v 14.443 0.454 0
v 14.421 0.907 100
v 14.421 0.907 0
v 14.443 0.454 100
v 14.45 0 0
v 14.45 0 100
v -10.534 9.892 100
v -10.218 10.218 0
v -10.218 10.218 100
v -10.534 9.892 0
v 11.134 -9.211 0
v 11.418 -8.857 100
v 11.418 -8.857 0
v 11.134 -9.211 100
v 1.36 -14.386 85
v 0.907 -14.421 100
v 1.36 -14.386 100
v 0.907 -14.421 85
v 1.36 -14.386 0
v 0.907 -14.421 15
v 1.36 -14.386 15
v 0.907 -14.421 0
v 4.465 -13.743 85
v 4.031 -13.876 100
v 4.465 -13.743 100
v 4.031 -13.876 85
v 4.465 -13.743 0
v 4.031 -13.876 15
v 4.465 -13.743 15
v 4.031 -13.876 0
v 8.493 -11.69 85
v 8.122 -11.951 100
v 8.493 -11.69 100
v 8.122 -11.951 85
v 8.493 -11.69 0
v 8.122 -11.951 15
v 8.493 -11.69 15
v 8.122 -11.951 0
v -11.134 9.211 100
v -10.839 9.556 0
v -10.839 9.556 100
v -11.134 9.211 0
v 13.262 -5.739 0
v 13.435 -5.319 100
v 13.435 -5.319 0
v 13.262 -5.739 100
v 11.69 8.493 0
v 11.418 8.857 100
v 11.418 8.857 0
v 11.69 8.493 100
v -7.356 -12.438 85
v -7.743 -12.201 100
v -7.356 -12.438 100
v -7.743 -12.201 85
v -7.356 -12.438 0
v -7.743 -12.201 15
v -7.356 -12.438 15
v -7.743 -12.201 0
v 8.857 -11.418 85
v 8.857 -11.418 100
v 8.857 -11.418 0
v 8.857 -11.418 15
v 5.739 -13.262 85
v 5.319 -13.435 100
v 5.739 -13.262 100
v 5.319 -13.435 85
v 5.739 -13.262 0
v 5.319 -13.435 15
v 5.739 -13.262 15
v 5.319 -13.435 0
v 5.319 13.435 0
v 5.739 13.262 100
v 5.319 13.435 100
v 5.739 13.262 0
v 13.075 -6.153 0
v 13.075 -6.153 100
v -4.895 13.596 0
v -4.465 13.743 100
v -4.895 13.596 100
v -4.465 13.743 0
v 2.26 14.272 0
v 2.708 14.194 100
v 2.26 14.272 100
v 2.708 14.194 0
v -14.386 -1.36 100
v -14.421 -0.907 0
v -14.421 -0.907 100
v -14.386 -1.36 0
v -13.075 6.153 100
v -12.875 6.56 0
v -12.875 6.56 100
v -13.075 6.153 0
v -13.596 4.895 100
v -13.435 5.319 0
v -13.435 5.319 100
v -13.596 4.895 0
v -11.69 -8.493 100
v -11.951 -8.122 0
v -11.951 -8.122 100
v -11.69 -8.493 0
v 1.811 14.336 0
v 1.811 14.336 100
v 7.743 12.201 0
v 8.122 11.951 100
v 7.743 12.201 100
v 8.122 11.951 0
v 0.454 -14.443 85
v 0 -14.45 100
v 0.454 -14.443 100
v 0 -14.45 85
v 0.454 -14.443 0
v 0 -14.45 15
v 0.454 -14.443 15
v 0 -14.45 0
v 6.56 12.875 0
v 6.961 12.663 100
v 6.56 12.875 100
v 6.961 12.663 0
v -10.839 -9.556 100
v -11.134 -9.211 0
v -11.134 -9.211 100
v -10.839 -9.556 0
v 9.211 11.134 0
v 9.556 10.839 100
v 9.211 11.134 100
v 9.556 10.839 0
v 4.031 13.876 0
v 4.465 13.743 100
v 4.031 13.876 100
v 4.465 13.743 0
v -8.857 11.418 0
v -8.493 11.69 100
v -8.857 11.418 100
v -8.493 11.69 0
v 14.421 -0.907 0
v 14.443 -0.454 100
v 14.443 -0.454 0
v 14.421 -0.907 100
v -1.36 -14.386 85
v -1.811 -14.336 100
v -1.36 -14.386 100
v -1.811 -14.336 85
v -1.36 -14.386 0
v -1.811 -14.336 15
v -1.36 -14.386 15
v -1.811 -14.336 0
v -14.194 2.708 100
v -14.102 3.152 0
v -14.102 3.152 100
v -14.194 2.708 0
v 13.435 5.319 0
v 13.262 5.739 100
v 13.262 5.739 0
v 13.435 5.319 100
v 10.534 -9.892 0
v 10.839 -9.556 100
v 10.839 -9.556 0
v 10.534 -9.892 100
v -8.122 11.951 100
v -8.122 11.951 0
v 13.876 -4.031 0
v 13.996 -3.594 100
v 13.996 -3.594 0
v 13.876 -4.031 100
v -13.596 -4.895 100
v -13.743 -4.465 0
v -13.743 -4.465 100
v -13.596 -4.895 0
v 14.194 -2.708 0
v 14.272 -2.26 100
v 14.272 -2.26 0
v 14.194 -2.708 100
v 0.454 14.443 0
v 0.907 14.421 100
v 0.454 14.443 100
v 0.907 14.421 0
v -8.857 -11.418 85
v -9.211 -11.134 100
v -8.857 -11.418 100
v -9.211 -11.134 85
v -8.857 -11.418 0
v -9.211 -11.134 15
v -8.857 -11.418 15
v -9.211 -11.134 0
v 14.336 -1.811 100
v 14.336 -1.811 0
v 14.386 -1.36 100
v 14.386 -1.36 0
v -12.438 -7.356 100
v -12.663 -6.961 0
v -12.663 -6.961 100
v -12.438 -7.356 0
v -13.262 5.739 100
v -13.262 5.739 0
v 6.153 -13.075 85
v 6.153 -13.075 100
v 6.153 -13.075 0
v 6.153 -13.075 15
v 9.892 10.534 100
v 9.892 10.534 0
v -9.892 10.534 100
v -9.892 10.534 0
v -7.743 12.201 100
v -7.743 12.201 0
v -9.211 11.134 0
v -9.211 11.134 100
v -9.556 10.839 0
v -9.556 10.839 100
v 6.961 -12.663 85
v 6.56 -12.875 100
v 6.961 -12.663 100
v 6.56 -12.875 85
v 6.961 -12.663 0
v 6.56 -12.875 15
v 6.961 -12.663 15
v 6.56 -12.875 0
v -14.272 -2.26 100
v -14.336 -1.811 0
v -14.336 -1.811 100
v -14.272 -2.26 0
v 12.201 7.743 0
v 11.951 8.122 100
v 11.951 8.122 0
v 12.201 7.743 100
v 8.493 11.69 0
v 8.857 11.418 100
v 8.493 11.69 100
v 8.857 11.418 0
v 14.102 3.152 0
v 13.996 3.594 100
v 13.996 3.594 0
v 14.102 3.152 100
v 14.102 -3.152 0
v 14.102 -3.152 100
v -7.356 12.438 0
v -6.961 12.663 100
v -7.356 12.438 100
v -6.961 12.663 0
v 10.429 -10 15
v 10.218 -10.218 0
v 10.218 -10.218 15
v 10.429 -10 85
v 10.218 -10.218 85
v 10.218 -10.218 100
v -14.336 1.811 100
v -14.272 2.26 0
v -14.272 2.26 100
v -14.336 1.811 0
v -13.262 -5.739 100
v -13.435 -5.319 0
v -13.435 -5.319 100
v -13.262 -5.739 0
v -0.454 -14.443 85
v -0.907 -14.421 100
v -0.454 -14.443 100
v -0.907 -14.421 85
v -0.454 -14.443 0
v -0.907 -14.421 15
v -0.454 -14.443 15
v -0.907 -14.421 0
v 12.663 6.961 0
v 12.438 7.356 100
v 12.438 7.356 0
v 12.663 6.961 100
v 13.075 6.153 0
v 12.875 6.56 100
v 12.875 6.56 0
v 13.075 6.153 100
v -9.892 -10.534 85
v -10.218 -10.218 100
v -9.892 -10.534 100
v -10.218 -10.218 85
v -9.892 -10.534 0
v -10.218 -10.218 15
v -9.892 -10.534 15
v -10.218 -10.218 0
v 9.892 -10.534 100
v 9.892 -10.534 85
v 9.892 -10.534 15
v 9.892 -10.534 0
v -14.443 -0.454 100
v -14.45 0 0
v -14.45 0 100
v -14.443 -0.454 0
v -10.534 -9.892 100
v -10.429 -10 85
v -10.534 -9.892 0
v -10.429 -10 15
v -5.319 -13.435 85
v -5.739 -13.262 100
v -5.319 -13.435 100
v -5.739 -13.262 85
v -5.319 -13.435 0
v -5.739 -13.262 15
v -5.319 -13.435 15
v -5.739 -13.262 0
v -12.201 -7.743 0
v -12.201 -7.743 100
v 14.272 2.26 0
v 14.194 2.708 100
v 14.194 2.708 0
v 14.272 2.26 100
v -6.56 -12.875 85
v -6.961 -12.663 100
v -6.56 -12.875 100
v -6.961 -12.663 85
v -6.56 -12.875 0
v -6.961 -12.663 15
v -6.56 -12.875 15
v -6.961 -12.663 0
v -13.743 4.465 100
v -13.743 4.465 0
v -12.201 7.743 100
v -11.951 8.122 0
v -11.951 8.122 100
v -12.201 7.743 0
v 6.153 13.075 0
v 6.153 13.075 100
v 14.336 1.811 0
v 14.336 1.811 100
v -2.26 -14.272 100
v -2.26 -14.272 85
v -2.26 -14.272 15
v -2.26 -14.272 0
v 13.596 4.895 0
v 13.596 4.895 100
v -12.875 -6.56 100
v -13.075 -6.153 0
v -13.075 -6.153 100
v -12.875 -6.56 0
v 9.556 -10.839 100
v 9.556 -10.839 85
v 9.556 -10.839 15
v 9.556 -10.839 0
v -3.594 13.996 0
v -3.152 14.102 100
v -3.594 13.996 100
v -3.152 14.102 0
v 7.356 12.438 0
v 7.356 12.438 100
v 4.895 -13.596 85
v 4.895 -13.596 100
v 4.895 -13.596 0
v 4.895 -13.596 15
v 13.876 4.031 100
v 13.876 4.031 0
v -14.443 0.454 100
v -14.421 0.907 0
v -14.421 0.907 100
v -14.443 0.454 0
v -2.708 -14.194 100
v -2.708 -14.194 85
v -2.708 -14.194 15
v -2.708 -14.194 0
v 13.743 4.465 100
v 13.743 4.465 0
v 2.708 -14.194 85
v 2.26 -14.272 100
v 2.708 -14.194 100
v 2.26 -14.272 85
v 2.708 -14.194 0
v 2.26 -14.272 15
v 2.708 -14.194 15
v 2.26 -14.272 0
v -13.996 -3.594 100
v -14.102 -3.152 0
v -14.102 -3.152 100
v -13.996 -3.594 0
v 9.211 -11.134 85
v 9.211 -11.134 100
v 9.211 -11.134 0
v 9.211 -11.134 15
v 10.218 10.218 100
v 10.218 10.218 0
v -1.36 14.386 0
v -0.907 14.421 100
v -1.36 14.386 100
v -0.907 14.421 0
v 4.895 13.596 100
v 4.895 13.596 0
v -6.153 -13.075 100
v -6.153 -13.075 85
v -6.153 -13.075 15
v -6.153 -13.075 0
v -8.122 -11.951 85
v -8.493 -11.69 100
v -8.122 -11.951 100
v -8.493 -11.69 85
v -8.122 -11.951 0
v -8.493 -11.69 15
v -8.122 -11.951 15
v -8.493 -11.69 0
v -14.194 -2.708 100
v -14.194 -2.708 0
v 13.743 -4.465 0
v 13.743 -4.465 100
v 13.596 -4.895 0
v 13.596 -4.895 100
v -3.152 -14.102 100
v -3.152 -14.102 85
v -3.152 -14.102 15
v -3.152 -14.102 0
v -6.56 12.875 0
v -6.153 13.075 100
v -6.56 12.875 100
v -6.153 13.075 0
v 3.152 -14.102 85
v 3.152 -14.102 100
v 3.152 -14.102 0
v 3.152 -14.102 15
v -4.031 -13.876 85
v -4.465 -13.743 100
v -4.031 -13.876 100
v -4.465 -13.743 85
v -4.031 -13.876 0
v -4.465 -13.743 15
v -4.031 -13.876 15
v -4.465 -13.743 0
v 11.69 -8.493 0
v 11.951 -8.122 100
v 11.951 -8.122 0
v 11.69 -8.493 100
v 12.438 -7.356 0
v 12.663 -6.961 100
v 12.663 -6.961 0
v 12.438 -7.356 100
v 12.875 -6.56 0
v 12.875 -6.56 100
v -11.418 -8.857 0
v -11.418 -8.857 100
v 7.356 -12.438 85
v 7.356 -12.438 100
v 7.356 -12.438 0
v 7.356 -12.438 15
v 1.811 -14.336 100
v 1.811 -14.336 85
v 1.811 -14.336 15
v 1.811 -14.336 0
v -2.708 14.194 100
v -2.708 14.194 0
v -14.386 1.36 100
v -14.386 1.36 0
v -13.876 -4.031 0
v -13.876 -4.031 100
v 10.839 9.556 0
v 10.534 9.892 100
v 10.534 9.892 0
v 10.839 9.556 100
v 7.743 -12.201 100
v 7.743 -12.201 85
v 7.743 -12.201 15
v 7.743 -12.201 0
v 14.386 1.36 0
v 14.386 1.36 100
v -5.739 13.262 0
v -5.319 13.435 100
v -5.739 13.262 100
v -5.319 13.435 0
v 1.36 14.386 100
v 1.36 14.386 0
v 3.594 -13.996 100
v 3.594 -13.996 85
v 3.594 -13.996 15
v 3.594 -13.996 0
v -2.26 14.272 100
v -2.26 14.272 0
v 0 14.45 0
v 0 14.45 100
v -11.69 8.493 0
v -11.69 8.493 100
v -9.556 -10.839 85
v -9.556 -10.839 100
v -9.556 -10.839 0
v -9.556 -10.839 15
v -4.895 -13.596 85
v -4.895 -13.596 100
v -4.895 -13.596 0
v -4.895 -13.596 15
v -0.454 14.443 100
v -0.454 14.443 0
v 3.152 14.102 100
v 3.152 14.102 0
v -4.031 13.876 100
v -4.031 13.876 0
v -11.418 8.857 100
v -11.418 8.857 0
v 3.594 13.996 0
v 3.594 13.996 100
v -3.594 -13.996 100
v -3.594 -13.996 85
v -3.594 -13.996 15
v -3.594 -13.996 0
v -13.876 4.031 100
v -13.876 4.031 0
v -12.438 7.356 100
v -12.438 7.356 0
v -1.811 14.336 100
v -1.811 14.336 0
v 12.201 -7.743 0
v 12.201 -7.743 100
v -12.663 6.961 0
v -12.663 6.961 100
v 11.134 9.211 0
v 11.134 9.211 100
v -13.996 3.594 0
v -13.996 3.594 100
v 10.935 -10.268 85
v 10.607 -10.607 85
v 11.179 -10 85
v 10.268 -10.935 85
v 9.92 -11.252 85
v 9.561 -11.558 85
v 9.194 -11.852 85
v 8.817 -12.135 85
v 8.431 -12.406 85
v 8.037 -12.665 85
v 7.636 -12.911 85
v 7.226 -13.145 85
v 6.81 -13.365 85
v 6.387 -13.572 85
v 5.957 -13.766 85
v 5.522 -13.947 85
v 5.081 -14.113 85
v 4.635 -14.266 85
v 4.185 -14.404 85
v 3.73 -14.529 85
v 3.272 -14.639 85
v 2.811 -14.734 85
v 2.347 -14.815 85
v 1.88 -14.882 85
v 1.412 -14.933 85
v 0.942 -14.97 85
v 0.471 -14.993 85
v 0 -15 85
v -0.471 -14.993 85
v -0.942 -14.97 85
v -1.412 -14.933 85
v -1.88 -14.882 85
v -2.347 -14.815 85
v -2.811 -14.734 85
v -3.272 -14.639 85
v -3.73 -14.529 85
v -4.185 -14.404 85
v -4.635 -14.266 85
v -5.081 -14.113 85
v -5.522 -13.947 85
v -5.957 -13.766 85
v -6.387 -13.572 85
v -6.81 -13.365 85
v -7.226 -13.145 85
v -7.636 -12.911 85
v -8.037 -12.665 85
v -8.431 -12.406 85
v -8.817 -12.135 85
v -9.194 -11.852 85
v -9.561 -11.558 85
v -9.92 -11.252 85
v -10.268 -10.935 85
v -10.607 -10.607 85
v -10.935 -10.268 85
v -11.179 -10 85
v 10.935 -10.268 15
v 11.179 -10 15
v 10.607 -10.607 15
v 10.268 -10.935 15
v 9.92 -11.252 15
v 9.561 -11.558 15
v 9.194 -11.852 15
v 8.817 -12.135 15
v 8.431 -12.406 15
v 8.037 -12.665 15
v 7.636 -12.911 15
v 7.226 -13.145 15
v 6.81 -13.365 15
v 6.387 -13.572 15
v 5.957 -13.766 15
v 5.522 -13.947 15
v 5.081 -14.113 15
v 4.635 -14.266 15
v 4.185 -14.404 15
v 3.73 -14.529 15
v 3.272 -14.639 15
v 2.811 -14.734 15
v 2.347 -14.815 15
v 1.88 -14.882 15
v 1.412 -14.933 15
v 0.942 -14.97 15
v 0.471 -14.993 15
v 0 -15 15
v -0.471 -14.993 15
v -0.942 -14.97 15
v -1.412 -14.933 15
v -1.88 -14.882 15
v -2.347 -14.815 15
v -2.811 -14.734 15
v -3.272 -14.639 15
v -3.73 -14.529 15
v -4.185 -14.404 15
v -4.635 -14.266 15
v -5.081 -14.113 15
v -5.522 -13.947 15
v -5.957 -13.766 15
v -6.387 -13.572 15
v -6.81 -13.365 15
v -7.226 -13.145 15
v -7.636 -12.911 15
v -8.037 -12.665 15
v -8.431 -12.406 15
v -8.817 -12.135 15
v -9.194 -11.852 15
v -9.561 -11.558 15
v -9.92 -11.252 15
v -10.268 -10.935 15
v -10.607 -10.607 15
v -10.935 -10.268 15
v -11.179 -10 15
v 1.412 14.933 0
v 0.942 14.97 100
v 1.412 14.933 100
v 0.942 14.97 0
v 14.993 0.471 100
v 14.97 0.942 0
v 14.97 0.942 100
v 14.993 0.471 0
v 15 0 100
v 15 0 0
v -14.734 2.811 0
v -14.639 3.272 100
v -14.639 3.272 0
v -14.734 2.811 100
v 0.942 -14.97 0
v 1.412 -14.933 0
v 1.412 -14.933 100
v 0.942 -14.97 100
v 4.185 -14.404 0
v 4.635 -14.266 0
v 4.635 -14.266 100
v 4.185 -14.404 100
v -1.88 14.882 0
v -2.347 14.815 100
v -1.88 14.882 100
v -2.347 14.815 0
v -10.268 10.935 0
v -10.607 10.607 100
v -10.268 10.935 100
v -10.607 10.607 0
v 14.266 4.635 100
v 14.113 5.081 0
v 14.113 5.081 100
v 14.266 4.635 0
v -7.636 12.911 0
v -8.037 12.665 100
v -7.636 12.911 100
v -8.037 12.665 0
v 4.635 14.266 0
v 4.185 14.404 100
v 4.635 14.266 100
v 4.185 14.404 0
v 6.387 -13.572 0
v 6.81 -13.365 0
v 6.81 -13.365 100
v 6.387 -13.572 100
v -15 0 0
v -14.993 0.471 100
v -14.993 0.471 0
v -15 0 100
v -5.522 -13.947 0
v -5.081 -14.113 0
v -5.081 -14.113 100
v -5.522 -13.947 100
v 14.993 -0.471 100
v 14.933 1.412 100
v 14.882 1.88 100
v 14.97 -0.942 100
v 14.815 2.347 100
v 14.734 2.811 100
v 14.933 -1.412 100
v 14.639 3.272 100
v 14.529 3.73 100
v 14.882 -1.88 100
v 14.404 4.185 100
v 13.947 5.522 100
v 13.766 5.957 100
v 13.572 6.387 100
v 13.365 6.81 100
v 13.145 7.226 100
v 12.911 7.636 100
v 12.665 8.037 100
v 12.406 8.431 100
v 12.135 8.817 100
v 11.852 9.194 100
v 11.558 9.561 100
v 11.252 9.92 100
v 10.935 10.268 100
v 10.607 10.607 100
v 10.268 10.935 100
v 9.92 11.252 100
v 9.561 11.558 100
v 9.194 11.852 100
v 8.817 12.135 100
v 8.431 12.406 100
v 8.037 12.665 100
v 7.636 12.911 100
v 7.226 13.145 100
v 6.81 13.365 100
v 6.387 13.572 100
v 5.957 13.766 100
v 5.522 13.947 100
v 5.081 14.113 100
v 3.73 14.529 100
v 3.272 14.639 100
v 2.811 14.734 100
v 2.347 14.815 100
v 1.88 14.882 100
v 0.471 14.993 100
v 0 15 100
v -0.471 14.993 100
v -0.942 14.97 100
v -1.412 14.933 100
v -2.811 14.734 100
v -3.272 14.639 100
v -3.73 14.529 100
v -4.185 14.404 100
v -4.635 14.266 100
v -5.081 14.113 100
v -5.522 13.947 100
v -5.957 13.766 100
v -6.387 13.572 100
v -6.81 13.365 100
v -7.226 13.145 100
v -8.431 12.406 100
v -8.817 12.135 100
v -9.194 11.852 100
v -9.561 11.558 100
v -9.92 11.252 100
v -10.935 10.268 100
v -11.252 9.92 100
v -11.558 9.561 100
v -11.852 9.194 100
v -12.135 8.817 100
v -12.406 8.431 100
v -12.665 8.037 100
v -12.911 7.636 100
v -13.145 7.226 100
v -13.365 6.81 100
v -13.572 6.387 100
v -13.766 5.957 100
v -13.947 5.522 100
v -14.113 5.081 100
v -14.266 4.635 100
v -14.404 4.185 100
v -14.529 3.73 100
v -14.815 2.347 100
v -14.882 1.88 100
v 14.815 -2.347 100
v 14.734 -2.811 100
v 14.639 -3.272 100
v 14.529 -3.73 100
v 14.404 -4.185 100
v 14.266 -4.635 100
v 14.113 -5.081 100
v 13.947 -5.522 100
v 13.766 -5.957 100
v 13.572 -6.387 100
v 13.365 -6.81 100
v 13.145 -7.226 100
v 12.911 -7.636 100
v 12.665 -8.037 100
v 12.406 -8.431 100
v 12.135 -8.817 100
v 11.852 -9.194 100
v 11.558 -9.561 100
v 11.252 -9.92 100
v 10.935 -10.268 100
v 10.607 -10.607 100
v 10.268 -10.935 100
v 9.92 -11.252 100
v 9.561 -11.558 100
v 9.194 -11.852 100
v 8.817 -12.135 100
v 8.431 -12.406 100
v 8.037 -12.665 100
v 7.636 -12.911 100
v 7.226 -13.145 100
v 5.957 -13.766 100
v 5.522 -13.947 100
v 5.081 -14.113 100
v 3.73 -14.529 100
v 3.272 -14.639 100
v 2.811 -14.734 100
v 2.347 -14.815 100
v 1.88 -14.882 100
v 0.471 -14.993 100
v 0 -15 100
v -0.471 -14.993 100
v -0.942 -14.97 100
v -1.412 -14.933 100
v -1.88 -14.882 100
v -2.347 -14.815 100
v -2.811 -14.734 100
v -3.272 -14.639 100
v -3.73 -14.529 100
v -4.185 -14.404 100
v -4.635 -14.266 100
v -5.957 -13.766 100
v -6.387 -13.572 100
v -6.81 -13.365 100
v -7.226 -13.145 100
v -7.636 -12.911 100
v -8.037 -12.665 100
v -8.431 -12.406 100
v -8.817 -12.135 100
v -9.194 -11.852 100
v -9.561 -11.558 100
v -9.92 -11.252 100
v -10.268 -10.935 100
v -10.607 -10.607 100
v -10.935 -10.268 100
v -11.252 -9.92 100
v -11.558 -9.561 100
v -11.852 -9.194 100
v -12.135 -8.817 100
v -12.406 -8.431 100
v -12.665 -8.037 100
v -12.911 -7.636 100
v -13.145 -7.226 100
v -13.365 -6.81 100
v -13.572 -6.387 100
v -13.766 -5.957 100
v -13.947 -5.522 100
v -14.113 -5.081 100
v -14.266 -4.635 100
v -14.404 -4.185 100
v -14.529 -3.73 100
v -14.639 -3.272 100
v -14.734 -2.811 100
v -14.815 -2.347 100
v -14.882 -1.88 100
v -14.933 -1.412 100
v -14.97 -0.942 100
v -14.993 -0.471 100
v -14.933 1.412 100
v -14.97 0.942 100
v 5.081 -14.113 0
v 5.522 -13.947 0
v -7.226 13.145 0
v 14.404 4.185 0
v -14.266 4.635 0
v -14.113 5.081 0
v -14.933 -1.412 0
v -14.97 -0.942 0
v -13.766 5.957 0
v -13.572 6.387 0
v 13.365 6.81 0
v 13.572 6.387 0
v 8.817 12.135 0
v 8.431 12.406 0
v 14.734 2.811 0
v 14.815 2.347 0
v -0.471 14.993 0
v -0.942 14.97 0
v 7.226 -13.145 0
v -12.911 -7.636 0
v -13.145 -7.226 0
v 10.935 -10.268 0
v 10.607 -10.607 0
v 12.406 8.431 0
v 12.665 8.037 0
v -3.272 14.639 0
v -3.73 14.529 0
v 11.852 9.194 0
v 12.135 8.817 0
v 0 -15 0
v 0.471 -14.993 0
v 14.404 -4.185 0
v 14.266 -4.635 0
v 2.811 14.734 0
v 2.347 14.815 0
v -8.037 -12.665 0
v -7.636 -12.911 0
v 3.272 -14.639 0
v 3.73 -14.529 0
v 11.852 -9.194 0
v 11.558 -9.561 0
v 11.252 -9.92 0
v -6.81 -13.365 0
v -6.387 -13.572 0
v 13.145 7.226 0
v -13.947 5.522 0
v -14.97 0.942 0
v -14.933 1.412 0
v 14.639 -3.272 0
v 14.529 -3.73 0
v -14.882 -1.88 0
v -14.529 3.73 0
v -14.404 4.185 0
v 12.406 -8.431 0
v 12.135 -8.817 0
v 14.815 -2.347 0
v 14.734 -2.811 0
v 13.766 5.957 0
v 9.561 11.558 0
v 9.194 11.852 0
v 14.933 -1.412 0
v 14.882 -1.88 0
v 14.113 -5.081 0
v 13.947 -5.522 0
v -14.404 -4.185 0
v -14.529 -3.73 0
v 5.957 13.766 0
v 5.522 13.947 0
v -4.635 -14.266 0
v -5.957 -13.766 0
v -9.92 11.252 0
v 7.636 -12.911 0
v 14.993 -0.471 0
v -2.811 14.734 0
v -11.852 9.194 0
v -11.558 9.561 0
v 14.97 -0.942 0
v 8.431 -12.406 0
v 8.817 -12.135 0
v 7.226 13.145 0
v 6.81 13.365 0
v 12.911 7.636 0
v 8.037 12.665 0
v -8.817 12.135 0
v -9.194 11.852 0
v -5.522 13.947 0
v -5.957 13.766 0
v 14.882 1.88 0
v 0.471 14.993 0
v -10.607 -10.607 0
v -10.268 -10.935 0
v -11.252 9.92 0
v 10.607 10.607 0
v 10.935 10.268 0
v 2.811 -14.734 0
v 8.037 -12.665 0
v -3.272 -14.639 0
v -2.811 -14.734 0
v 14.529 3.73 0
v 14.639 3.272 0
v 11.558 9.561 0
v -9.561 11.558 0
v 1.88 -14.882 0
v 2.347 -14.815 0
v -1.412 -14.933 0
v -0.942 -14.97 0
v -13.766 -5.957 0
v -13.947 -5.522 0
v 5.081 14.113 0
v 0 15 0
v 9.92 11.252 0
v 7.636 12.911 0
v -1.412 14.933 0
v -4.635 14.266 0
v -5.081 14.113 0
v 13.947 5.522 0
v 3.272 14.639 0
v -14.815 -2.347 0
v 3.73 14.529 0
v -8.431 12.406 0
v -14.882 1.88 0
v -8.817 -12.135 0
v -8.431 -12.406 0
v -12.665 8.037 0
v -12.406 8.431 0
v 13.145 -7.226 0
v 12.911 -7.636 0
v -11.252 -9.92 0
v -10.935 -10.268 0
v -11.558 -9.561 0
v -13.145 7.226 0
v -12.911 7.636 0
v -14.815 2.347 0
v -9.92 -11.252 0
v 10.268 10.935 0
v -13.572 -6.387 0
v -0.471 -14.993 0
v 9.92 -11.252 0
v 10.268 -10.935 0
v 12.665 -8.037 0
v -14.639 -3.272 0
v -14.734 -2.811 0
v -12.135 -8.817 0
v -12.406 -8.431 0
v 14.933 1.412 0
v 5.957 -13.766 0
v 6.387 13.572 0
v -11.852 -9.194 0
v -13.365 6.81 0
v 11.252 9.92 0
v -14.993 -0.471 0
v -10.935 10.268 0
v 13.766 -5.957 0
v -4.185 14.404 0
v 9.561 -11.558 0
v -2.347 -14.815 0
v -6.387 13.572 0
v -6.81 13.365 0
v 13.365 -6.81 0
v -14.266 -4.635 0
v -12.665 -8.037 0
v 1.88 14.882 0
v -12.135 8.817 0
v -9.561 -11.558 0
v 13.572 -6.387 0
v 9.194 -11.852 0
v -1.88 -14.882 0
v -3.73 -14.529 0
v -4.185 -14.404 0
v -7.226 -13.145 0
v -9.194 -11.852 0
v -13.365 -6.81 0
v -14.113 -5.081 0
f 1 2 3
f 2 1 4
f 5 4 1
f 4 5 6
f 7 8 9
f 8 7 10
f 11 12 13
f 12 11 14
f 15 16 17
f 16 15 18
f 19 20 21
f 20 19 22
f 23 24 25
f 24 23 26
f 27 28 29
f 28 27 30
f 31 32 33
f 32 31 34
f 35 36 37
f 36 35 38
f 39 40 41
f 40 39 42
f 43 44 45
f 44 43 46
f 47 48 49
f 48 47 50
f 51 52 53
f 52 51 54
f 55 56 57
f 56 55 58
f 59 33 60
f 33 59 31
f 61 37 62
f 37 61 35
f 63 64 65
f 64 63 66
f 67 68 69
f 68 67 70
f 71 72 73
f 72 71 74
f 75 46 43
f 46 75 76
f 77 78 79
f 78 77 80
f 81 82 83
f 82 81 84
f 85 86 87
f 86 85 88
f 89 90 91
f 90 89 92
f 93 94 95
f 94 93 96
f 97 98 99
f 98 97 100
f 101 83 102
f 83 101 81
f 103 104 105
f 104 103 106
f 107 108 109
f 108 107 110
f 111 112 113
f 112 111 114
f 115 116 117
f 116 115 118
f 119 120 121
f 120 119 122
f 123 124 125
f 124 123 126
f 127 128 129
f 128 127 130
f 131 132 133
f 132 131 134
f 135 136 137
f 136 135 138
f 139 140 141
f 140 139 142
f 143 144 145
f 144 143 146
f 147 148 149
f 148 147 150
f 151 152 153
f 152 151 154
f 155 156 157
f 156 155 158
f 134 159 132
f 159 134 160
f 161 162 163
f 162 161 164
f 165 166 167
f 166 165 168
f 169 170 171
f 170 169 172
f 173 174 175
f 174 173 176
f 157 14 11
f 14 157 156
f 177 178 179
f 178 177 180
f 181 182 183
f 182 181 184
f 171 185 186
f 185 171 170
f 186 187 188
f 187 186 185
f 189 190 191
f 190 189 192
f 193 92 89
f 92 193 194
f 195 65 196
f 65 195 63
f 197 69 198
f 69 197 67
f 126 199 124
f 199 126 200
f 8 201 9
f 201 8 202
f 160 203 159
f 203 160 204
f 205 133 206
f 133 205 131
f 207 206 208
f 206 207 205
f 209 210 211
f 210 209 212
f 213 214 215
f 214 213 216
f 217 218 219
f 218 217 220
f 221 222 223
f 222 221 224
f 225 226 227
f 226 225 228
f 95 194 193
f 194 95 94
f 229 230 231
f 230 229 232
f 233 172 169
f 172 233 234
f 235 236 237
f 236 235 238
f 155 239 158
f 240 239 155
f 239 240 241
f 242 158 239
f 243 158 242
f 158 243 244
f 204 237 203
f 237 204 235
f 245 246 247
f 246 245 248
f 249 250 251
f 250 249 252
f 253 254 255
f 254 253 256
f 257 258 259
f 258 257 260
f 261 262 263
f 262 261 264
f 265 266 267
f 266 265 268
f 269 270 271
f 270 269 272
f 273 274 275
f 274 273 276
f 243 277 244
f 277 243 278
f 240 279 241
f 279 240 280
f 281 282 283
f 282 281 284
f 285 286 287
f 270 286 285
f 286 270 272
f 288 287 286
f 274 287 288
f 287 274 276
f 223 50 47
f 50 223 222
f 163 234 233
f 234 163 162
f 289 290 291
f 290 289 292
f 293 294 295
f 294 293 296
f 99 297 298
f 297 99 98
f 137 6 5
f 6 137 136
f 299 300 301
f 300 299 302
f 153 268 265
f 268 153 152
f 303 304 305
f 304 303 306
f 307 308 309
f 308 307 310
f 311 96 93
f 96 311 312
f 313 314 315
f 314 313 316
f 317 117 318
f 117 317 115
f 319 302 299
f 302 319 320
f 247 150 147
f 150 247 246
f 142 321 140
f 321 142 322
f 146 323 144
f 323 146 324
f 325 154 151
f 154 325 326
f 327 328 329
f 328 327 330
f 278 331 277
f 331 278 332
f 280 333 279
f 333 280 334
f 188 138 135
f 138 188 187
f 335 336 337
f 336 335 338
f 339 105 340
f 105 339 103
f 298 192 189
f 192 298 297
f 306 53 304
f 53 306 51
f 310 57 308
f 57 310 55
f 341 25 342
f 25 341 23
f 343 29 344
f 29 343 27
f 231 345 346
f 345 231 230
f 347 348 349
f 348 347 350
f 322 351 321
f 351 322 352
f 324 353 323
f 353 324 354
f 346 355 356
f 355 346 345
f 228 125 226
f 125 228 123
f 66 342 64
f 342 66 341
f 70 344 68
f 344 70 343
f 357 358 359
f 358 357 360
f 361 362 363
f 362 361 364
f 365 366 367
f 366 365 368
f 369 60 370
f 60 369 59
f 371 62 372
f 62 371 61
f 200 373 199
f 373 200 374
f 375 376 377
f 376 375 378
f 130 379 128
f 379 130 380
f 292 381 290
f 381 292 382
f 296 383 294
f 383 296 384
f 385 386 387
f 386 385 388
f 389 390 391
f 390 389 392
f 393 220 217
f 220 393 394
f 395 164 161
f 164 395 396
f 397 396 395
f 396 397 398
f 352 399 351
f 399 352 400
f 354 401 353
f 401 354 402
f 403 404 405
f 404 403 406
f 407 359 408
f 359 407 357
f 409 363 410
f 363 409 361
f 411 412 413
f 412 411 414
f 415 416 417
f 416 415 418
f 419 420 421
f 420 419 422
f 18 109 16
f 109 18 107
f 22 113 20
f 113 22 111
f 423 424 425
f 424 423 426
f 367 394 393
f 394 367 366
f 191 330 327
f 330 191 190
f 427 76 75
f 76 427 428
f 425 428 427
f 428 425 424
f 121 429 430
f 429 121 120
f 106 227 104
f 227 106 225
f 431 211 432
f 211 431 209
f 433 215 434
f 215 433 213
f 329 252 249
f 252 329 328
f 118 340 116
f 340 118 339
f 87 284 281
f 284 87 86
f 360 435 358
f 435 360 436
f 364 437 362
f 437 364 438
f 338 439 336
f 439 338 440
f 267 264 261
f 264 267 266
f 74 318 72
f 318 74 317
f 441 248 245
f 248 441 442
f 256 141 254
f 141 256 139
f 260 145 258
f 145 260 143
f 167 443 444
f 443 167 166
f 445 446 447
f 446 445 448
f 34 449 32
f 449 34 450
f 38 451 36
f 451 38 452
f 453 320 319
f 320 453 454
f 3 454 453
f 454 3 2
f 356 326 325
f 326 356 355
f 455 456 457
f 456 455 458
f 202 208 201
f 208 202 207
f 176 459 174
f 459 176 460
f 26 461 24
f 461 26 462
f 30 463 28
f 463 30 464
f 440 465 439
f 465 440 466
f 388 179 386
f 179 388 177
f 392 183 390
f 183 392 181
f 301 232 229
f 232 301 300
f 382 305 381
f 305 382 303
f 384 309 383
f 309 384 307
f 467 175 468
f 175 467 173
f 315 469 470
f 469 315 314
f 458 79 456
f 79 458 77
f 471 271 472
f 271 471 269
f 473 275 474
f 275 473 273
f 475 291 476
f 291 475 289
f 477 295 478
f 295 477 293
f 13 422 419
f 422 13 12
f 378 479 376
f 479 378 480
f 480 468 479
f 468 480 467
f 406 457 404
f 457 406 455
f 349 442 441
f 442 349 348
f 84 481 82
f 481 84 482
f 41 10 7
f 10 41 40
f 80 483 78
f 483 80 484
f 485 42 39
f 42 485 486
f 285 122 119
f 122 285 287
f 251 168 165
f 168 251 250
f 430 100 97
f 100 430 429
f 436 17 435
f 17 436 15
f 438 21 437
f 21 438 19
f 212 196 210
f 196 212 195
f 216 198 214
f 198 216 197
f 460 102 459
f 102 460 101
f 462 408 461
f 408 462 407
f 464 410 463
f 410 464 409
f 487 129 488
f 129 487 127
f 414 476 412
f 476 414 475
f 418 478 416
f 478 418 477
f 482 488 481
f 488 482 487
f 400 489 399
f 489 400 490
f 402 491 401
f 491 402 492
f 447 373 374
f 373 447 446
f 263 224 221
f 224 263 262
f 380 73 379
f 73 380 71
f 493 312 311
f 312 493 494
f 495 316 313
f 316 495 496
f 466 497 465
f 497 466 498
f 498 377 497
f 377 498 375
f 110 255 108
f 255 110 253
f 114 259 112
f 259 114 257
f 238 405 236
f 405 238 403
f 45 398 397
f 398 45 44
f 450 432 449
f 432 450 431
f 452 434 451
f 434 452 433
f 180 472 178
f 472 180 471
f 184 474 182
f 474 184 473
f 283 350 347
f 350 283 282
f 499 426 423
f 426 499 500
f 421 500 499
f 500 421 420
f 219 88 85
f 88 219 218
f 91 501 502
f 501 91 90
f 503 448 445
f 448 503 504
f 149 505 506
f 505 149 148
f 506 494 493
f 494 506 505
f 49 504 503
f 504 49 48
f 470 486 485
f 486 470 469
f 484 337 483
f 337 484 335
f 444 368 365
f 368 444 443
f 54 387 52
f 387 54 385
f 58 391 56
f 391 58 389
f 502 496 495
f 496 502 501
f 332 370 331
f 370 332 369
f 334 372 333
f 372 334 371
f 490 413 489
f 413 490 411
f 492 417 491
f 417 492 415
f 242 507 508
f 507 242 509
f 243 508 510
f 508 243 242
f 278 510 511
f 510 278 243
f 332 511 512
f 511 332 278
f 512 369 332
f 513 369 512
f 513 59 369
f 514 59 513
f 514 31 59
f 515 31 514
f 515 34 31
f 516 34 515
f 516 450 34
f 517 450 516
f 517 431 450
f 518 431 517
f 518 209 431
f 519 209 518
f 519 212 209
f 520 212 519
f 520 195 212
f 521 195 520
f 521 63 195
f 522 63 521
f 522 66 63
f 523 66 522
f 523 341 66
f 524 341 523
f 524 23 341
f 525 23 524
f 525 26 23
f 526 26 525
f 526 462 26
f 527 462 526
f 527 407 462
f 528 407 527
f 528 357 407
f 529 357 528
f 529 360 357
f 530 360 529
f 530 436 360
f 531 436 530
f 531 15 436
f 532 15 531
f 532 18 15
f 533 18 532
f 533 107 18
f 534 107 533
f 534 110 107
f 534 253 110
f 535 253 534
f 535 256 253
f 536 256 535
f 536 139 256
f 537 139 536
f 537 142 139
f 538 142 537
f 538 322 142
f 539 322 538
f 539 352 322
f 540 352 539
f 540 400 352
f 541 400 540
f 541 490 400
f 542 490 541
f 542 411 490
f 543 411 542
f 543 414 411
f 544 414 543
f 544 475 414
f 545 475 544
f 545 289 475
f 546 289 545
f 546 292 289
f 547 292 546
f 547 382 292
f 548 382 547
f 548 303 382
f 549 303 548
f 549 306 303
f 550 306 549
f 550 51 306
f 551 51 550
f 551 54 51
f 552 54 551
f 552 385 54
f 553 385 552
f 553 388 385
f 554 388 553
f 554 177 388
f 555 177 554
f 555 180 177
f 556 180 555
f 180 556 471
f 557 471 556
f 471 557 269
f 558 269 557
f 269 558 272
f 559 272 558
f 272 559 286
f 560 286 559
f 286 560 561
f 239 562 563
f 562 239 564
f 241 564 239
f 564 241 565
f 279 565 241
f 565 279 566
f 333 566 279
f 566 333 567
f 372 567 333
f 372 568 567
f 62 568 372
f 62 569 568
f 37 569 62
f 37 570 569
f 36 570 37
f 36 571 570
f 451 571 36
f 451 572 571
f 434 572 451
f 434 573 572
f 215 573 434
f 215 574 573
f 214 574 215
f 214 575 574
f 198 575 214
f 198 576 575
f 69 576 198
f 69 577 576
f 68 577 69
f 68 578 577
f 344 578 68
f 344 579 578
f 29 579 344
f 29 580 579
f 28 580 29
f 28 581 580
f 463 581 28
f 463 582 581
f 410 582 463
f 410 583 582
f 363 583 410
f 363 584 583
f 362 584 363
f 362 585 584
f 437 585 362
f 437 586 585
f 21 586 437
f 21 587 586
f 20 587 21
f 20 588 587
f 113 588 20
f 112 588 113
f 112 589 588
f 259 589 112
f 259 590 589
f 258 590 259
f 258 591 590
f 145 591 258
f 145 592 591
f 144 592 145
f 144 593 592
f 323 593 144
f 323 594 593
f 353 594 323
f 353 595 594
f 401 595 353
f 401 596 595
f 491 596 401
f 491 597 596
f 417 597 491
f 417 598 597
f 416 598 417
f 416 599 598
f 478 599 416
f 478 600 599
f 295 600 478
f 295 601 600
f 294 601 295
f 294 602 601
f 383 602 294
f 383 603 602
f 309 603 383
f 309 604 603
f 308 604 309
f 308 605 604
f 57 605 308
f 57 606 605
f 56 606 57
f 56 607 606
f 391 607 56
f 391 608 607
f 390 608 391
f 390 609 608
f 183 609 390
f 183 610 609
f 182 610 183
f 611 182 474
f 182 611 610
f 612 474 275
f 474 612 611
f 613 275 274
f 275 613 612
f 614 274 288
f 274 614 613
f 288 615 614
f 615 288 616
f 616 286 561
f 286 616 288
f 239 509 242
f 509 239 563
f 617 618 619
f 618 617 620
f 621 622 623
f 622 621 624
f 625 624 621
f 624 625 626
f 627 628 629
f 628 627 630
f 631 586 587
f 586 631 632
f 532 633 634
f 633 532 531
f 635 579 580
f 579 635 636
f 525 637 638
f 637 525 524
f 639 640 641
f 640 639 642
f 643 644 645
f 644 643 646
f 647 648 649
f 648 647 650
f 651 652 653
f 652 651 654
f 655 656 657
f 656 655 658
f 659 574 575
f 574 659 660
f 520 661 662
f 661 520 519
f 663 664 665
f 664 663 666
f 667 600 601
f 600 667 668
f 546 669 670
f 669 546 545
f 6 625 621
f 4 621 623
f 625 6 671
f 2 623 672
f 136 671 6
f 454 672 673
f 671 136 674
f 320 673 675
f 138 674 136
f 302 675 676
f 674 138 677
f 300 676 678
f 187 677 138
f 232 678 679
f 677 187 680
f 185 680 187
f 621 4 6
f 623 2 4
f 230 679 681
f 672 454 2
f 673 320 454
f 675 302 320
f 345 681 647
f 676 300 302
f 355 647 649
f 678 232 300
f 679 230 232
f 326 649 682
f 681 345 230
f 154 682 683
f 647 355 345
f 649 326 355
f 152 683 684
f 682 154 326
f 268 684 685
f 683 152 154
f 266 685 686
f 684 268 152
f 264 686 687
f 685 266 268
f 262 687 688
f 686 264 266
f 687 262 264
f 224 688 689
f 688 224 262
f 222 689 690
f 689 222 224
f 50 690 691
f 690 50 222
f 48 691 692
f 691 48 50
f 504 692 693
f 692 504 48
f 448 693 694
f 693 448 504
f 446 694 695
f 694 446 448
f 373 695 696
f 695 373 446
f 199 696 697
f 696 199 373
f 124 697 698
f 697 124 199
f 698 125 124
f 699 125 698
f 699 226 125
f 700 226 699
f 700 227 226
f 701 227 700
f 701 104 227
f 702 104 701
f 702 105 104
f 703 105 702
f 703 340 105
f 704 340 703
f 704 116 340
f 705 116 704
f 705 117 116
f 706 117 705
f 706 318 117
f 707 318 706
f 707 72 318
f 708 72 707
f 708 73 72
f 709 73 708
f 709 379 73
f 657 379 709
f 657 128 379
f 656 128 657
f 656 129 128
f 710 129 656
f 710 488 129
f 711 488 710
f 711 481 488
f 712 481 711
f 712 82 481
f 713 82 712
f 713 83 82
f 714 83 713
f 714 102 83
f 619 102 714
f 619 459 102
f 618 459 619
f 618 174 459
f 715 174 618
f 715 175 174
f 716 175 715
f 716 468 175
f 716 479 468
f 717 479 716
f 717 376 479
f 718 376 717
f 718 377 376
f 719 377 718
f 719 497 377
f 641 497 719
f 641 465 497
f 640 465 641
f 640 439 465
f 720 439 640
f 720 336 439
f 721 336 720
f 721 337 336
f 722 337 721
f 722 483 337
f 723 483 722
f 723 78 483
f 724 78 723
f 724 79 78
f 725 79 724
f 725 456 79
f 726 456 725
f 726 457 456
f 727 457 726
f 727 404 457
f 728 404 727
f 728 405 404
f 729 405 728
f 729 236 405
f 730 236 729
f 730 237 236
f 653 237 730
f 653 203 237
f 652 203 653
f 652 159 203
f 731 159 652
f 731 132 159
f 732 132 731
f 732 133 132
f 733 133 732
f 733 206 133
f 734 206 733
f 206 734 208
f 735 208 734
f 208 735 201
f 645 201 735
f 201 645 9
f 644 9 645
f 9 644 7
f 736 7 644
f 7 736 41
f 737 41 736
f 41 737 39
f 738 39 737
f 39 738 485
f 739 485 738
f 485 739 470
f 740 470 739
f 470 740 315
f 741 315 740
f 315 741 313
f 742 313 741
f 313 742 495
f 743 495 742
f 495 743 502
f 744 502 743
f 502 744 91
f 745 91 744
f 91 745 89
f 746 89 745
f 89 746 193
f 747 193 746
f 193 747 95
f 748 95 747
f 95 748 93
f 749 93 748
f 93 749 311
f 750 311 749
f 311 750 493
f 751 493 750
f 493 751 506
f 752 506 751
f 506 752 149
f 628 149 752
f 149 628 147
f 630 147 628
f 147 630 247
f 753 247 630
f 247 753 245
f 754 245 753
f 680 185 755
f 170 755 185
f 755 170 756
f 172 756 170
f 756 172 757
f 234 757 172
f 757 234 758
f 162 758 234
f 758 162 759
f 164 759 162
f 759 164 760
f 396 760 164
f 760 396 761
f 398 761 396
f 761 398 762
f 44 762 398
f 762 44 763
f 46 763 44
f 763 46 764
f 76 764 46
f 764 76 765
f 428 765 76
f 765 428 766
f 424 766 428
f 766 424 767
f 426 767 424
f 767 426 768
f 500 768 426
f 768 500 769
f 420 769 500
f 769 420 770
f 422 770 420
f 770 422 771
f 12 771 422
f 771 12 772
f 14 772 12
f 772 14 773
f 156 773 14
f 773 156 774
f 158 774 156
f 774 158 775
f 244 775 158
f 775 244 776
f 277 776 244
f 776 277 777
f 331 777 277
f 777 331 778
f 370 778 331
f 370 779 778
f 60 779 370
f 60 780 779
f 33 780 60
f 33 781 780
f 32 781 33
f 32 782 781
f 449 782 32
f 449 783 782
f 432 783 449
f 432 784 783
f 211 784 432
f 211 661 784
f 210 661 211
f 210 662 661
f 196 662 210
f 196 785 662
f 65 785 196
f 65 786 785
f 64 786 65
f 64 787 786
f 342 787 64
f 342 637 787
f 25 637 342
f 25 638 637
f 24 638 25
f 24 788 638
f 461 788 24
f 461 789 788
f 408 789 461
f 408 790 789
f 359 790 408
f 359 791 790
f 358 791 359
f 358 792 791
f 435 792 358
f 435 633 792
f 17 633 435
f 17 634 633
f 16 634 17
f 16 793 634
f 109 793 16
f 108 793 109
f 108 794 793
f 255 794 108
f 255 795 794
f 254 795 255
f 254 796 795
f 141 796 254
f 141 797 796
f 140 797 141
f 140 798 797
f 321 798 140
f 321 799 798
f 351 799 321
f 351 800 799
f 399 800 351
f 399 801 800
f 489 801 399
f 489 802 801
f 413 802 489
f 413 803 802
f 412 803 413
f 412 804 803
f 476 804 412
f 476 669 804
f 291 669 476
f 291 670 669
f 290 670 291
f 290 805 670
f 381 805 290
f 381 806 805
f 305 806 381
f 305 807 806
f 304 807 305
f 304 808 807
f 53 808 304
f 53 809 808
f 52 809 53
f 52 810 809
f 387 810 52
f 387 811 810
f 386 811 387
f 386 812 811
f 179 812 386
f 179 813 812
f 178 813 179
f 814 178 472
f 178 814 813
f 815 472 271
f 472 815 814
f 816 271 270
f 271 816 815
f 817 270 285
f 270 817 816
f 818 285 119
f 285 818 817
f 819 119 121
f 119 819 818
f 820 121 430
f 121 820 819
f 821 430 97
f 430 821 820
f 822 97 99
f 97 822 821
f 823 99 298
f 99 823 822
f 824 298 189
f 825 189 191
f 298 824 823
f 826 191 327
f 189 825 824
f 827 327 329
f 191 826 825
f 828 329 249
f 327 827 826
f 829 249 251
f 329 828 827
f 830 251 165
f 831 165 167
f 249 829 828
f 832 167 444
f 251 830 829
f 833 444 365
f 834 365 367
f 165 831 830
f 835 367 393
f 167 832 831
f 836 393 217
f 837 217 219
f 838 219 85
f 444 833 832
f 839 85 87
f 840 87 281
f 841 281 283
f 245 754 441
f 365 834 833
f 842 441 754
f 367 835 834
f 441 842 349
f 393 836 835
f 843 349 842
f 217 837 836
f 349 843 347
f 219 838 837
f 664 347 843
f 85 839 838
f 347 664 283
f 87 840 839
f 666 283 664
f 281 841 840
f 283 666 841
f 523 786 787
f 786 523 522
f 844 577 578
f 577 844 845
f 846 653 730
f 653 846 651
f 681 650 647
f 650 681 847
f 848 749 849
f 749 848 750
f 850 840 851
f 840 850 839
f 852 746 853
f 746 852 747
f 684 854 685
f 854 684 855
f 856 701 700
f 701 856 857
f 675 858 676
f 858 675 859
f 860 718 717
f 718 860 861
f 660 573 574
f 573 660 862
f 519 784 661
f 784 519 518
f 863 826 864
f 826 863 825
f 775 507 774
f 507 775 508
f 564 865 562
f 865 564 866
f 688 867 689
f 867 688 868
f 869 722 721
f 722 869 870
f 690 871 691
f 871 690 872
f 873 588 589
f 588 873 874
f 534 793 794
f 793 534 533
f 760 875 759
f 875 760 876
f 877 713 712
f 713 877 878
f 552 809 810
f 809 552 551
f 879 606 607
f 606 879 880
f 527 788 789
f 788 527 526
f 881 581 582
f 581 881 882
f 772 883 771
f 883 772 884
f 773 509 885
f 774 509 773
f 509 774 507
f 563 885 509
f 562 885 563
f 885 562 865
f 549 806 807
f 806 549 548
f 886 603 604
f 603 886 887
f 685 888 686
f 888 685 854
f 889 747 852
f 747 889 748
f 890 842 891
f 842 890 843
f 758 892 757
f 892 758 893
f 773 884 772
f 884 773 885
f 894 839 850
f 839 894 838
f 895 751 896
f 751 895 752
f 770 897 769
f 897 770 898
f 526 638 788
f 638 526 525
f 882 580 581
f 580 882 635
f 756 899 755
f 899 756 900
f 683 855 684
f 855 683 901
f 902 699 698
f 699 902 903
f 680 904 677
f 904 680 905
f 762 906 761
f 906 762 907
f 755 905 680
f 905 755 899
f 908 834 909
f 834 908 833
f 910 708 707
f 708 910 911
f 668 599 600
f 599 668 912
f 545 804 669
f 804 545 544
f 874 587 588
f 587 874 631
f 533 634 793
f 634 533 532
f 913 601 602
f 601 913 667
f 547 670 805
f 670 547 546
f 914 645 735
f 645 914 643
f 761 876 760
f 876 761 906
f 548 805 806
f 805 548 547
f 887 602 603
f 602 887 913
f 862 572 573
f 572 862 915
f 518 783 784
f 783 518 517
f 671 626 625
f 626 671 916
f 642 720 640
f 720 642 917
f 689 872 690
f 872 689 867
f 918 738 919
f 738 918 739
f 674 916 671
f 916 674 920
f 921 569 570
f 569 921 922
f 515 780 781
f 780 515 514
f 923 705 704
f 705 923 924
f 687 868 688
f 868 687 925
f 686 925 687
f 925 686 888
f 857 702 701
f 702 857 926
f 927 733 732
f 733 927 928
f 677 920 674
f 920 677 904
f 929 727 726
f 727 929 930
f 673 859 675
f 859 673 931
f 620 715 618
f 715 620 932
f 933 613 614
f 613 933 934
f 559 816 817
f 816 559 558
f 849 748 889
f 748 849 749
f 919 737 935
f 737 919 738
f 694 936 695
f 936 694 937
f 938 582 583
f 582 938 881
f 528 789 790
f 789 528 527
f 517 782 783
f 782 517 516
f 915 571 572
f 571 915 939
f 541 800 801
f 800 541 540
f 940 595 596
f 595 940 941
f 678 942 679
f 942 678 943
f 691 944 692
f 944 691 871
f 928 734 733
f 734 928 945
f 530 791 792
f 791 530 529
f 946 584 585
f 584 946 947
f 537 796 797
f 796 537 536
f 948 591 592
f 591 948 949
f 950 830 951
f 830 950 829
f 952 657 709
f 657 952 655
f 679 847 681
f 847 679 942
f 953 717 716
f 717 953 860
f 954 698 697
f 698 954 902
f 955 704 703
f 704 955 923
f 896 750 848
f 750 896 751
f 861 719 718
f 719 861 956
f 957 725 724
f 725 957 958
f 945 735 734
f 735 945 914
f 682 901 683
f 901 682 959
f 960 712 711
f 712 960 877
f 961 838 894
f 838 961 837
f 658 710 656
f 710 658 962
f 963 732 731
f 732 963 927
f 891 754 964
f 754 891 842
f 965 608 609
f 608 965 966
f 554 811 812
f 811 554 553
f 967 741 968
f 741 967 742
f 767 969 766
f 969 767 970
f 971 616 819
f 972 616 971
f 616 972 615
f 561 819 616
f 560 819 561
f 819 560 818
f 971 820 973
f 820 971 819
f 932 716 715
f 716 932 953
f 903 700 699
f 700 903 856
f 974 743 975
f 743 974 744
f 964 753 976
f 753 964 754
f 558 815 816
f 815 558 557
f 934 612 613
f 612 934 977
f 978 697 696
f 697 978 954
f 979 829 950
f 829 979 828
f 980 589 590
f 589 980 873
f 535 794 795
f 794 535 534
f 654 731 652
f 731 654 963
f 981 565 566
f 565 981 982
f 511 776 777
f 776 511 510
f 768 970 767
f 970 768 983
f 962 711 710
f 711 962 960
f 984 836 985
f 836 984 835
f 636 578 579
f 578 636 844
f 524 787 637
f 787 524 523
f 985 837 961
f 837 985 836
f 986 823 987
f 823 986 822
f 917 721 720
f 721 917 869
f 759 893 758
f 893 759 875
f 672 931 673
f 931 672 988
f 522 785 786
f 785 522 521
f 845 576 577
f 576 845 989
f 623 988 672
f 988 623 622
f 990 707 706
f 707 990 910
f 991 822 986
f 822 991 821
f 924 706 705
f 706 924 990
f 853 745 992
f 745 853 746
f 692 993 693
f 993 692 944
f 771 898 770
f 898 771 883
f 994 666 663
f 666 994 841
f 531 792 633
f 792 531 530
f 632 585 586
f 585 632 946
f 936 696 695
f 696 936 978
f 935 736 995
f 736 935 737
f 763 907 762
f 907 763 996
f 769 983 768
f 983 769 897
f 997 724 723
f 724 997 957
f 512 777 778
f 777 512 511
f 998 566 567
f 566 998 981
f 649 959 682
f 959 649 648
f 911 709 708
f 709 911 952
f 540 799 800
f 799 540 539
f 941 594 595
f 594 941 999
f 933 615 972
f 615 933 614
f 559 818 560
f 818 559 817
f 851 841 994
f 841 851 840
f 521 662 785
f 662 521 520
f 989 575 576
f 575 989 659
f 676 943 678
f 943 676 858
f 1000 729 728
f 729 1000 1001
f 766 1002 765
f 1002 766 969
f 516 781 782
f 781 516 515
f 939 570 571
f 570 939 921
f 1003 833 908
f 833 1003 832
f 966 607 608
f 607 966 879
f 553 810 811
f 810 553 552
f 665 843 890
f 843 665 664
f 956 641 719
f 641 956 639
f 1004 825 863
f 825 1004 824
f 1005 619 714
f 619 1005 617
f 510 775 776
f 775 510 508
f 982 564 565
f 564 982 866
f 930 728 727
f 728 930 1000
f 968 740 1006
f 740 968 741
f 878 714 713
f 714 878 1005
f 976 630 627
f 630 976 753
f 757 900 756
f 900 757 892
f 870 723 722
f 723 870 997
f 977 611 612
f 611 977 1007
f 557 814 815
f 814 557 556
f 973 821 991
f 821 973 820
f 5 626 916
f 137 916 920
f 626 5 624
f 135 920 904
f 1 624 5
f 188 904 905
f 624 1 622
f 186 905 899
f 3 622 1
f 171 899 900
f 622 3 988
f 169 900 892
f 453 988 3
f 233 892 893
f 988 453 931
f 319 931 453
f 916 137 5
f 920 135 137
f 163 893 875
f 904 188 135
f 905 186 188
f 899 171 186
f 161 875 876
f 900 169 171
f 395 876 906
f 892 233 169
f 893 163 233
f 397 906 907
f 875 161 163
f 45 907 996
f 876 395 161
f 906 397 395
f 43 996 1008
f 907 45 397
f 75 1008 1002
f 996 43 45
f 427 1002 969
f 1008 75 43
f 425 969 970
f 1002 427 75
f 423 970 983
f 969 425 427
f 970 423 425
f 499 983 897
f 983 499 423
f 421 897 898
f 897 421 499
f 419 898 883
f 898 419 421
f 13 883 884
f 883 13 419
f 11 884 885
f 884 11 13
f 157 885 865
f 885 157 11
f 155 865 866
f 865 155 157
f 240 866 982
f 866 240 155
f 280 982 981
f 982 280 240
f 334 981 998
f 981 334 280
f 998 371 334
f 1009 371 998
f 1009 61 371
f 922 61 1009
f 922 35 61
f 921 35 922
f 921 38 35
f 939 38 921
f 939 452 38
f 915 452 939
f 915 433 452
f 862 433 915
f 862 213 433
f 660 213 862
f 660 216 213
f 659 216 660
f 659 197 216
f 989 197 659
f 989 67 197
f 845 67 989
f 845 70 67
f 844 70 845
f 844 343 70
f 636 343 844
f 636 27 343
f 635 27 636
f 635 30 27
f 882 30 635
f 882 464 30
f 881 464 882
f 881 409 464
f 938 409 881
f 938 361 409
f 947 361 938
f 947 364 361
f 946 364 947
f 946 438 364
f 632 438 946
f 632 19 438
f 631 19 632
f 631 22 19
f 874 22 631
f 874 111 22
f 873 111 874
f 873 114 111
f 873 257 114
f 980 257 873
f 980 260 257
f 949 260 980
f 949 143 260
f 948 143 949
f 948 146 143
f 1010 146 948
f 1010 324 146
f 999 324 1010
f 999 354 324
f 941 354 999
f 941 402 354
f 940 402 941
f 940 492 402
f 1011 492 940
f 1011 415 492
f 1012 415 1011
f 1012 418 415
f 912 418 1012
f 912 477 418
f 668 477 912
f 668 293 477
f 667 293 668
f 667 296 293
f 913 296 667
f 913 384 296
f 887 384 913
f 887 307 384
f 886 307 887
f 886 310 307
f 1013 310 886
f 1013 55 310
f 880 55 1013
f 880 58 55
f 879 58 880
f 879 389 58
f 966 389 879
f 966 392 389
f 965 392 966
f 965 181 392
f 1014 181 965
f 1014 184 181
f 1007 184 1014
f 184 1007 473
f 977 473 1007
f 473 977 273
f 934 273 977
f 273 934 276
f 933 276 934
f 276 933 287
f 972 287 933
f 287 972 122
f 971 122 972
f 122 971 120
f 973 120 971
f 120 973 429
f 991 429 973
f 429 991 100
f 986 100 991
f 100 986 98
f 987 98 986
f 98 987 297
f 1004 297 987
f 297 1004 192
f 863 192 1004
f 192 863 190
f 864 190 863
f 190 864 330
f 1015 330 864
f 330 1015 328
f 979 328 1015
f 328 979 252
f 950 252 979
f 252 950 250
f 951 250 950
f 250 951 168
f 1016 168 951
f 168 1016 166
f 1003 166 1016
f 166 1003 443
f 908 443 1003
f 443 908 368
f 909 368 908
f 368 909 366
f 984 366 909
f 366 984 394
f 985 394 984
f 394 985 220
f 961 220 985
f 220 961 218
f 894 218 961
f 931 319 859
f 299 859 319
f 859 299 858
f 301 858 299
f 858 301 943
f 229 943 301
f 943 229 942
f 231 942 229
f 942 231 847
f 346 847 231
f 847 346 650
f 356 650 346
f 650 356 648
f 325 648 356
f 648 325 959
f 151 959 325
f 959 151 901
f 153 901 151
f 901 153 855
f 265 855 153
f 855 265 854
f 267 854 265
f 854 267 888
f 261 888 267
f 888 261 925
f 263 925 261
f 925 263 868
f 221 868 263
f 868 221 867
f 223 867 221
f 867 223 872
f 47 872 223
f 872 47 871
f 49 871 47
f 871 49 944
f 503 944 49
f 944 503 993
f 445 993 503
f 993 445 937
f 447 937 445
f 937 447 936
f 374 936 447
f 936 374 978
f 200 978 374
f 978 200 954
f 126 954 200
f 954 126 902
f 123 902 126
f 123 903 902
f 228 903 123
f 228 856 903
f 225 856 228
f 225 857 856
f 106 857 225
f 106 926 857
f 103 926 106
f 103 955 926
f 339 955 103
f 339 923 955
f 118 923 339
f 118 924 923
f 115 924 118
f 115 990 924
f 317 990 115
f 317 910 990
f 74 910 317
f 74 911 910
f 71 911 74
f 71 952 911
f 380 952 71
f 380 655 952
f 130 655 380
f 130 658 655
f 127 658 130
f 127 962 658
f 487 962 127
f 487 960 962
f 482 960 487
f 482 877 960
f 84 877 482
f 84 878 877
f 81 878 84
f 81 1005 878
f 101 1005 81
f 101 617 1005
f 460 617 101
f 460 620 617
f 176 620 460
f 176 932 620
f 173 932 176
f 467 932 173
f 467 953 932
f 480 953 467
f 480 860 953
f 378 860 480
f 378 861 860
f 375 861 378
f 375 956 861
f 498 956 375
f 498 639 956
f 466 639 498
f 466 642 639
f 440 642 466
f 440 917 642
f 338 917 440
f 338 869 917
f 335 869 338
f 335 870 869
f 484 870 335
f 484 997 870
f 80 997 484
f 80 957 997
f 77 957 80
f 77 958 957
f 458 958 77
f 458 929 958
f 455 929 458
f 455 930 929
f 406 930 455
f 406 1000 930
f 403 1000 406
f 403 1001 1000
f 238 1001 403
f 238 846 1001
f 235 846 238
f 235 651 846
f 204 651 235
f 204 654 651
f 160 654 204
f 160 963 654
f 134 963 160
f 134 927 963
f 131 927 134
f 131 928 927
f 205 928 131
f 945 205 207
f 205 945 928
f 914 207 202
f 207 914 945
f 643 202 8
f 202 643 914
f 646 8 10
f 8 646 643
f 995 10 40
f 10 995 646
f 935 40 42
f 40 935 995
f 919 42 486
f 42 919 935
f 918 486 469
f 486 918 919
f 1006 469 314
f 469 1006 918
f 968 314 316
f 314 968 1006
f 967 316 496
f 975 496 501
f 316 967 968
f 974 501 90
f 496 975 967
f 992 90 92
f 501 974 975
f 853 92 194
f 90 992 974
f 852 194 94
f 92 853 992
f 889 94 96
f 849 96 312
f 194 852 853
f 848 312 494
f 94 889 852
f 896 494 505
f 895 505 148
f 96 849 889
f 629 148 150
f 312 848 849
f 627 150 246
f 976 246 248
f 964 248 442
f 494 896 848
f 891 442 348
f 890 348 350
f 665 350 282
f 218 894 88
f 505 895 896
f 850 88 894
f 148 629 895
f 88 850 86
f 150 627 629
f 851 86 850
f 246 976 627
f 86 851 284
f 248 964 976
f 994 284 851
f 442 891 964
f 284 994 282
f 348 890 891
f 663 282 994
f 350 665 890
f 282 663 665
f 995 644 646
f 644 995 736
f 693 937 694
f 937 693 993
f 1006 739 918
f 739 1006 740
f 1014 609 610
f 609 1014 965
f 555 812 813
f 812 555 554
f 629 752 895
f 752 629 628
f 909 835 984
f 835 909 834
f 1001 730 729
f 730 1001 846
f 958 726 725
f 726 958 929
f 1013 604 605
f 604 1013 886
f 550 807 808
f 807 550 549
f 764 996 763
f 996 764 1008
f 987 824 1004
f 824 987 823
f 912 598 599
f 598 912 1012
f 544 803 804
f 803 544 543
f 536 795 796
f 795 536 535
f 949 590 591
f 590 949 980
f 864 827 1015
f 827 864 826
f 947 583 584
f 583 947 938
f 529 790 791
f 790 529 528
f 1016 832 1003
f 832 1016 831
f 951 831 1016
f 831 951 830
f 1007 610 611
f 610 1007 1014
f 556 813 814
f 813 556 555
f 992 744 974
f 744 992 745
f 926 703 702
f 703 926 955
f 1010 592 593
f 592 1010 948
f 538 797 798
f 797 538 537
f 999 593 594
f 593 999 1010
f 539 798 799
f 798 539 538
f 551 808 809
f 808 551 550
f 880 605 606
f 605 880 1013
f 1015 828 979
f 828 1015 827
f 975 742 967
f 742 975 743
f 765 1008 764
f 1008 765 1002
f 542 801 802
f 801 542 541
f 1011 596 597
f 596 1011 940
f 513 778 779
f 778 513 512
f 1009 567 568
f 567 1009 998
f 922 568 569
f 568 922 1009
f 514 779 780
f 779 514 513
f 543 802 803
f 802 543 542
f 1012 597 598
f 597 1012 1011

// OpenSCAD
//Diameter of cylinder
diameter=30;
//Width of single wall layer
extrusionWidth=0.55;
//Height of cylinder
height=100;
//Height/thickness of bottom (0 for no bottom)
layerHeight=0;
//height of viewport
viewportheight=70;
//viewport width
viewportoffset=-10;
/* [hidden] */
rad=diameter/2;
$fn=200;

union() {
translate([0,0,-layerHeight]) cylinder(r=rad, h=layerHeight);
	difference () {
		cylinder(r=rad, h=height);
        union()
        {
            translate([0,0,-1])
            cylinder(r=rad-extrusionWidth, h=height+2);
            translate([-rad*2,-rad*2+viewportoffset,height/2-viewportheight/2])
            cube(size=[rad*6,rad*2,viewportheight]);
        }
	}
}
